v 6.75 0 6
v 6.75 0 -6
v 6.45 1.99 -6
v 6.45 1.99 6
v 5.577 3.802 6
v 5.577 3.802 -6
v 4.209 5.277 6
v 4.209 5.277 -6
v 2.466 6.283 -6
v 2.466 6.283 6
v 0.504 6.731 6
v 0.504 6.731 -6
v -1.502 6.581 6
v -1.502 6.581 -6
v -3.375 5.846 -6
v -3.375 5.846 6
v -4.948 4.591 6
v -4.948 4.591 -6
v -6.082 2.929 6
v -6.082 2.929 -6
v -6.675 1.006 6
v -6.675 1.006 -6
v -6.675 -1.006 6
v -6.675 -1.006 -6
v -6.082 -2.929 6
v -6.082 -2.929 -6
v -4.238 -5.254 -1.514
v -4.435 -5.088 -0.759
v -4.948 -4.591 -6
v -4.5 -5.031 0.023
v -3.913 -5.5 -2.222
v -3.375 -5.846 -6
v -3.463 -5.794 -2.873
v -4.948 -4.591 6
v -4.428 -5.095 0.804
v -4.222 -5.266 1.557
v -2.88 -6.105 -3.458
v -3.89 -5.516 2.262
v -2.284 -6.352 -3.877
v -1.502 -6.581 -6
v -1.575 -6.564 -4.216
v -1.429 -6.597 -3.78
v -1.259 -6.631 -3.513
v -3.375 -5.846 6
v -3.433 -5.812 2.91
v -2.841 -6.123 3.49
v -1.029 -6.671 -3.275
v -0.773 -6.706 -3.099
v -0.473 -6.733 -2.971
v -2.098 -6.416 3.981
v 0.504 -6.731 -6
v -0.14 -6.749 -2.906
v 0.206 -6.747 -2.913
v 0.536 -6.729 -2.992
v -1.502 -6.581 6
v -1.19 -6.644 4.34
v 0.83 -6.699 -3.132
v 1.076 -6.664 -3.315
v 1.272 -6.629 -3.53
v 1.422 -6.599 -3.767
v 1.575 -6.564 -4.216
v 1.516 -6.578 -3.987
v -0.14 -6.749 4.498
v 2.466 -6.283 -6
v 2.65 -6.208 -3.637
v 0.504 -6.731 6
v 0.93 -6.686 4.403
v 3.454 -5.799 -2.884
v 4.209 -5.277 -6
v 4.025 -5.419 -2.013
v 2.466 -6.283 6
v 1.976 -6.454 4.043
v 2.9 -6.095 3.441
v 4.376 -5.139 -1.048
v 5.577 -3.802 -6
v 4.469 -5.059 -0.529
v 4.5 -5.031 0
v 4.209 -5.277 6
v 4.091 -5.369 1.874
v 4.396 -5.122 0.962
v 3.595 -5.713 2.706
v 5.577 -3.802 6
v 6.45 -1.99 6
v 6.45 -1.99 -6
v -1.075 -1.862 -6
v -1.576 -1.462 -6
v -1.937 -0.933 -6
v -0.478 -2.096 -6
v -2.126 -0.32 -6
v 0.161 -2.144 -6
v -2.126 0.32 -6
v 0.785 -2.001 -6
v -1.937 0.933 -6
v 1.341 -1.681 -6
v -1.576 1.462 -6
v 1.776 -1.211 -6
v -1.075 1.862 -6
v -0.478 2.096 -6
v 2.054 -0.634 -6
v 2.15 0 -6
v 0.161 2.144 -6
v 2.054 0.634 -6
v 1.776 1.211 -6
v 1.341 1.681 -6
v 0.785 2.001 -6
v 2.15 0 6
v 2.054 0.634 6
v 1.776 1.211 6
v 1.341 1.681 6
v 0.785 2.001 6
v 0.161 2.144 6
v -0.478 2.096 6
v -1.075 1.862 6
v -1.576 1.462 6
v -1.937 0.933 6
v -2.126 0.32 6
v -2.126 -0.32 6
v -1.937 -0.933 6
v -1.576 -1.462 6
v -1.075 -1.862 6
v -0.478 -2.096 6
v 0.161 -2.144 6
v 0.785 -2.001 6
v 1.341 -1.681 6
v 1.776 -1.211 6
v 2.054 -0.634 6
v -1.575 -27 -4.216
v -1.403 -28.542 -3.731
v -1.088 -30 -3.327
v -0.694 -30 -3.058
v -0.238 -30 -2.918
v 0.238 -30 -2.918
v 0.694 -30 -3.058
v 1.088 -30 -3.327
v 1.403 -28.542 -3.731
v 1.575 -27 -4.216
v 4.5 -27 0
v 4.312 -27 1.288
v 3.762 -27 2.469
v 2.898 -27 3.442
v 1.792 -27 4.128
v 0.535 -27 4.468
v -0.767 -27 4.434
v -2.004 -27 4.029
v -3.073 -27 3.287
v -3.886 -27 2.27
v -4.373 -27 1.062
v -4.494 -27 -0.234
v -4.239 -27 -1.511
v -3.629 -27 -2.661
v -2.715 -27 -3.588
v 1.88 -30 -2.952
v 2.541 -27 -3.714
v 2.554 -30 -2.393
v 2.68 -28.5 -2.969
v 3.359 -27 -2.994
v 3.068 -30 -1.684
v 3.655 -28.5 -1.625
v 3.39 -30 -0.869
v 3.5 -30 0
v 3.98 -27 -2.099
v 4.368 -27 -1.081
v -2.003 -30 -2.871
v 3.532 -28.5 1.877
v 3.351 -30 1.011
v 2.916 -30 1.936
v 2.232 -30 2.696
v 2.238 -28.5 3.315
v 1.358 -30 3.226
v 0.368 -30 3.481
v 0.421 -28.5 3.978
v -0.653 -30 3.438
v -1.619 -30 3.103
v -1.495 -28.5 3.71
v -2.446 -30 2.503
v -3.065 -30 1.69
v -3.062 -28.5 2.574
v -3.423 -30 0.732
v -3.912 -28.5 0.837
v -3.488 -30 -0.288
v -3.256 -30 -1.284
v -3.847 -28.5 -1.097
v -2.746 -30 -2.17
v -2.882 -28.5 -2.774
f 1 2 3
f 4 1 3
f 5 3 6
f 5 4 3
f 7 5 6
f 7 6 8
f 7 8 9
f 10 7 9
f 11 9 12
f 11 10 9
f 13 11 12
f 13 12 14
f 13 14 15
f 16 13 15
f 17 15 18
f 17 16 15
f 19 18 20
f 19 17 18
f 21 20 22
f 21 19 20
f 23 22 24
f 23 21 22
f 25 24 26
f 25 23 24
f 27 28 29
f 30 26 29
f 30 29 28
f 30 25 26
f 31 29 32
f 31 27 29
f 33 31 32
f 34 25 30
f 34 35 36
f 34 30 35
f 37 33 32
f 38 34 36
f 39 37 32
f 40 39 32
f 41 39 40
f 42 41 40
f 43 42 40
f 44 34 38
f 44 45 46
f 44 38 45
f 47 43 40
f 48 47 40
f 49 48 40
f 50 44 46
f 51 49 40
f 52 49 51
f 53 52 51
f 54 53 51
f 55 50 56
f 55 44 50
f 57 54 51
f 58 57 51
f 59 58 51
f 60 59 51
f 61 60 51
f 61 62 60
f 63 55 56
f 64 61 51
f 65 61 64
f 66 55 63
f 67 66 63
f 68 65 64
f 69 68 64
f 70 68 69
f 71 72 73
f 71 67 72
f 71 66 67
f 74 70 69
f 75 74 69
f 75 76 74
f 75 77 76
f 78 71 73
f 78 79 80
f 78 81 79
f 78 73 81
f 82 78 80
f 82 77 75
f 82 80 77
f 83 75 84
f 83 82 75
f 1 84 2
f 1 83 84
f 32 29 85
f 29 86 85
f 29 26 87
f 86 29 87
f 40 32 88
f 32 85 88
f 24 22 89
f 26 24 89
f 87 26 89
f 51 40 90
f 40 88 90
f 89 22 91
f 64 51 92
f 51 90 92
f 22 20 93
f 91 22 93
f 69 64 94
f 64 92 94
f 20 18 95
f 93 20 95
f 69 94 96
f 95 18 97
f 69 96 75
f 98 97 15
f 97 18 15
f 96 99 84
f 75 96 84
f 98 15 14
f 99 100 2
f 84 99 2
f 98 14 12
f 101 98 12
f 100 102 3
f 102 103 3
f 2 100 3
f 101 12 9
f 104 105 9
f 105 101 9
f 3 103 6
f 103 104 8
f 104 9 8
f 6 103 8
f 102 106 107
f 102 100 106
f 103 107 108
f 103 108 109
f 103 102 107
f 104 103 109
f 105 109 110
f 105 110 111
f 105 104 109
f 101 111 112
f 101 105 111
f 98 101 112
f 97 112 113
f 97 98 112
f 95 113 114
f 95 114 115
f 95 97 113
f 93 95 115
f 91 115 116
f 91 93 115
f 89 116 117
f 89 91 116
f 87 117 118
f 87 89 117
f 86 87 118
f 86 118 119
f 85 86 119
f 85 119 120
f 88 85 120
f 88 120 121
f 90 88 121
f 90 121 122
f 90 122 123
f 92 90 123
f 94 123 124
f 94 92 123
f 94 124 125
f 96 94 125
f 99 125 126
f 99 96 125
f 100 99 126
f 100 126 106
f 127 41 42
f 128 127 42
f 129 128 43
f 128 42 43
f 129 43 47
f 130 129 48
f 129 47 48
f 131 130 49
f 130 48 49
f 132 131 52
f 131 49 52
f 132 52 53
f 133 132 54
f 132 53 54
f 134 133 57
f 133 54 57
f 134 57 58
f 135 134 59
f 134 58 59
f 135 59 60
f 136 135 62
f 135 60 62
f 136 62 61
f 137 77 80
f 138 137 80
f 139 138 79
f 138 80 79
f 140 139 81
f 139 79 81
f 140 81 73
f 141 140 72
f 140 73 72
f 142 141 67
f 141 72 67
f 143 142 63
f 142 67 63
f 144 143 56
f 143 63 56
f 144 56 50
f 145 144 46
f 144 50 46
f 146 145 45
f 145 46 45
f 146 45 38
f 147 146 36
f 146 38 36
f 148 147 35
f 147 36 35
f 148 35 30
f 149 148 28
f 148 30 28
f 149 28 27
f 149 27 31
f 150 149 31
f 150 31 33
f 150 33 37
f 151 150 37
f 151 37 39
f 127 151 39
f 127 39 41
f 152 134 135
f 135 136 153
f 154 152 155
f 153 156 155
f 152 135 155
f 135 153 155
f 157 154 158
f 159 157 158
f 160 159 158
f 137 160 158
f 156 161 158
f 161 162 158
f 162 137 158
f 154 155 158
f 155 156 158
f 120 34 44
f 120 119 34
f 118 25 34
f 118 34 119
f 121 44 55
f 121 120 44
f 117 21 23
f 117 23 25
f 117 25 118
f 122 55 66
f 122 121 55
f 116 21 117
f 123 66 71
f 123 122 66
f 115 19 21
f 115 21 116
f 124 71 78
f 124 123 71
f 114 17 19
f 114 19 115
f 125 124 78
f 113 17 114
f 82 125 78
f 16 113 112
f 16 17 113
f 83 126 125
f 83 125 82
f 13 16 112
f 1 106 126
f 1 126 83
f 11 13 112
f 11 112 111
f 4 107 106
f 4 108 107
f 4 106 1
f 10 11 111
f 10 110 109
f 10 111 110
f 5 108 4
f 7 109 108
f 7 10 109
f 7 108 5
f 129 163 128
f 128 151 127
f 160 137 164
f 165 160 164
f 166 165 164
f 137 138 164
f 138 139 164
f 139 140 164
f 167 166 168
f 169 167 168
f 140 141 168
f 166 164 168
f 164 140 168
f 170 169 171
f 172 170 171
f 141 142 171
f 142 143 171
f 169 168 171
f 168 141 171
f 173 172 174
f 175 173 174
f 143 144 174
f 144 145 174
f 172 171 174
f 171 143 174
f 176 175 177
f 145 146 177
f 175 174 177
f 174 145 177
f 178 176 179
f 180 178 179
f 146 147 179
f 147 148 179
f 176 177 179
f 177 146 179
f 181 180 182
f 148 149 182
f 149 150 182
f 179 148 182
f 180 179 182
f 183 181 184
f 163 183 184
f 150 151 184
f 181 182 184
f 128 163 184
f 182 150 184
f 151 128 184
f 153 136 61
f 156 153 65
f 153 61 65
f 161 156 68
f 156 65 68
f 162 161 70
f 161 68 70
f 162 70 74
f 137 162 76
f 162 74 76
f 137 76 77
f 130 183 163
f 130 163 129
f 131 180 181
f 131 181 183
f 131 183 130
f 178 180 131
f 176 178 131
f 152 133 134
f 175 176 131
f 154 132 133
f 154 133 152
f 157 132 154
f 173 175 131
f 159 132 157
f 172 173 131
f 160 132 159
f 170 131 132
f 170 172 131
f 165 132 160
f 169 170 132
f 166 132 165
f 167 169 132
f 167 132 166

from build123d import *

# Parameters (mm, degrees)
F0_R          = 6.75
F0_R_2        = 2.15
F1_DEPTH      = 6
F1_DEPTH_BACK = 6
F3_START      = 5
F3_DEPTH      = 25
F4_SIZE2      = 3
F4_SIZE       = 1


with BuildPart() as f1:
    # F0 (on Top) → F1 (new body, two sides)
    with BuildSketch(Plane.XY) as f1_sk:
        Circle(F0_R)
        Circle(F0_R_2, mode=Mode.SUBTRACT)
    extrude(amount=F1_DEPTH)
    extrude(f1_sk.sketch, amount=-F1_DEPTH_BACK)

    # F2 (on Front) → F3 (join)
    with BuildSketch(Plane.XZ.offset(F3_START)):
        with BuildLine():
            ThreePointArc((1.5745130543, -4.2155555556), (3.6969790873, -2.5656082374), (4.5, 0))
            ThreePointArc((4.5, 0), (-2.5656082374, 3.6969790873), (-1.5745130543, -4.2155555556))
            ThreePointArc((-1.5745130543, -4.2155555556), (0, -2.9), (1.5745130543, -4.2155555556))
        make_face()
    extrude(amount=F3_DEPTH)

    # F4
    f4_edges = [f1.edges().sort_by_distance(p)[0] for p in [
        (0, -30, 4.5),
    ]]
    f4_side = f1.faces().sort_by_distance((0, -30, 0.234076))[0]
    chamfer(f4_edges, length=F4_SIZE, length2=F4_SIZE2, reference=f4_side)


solid = f1.part
